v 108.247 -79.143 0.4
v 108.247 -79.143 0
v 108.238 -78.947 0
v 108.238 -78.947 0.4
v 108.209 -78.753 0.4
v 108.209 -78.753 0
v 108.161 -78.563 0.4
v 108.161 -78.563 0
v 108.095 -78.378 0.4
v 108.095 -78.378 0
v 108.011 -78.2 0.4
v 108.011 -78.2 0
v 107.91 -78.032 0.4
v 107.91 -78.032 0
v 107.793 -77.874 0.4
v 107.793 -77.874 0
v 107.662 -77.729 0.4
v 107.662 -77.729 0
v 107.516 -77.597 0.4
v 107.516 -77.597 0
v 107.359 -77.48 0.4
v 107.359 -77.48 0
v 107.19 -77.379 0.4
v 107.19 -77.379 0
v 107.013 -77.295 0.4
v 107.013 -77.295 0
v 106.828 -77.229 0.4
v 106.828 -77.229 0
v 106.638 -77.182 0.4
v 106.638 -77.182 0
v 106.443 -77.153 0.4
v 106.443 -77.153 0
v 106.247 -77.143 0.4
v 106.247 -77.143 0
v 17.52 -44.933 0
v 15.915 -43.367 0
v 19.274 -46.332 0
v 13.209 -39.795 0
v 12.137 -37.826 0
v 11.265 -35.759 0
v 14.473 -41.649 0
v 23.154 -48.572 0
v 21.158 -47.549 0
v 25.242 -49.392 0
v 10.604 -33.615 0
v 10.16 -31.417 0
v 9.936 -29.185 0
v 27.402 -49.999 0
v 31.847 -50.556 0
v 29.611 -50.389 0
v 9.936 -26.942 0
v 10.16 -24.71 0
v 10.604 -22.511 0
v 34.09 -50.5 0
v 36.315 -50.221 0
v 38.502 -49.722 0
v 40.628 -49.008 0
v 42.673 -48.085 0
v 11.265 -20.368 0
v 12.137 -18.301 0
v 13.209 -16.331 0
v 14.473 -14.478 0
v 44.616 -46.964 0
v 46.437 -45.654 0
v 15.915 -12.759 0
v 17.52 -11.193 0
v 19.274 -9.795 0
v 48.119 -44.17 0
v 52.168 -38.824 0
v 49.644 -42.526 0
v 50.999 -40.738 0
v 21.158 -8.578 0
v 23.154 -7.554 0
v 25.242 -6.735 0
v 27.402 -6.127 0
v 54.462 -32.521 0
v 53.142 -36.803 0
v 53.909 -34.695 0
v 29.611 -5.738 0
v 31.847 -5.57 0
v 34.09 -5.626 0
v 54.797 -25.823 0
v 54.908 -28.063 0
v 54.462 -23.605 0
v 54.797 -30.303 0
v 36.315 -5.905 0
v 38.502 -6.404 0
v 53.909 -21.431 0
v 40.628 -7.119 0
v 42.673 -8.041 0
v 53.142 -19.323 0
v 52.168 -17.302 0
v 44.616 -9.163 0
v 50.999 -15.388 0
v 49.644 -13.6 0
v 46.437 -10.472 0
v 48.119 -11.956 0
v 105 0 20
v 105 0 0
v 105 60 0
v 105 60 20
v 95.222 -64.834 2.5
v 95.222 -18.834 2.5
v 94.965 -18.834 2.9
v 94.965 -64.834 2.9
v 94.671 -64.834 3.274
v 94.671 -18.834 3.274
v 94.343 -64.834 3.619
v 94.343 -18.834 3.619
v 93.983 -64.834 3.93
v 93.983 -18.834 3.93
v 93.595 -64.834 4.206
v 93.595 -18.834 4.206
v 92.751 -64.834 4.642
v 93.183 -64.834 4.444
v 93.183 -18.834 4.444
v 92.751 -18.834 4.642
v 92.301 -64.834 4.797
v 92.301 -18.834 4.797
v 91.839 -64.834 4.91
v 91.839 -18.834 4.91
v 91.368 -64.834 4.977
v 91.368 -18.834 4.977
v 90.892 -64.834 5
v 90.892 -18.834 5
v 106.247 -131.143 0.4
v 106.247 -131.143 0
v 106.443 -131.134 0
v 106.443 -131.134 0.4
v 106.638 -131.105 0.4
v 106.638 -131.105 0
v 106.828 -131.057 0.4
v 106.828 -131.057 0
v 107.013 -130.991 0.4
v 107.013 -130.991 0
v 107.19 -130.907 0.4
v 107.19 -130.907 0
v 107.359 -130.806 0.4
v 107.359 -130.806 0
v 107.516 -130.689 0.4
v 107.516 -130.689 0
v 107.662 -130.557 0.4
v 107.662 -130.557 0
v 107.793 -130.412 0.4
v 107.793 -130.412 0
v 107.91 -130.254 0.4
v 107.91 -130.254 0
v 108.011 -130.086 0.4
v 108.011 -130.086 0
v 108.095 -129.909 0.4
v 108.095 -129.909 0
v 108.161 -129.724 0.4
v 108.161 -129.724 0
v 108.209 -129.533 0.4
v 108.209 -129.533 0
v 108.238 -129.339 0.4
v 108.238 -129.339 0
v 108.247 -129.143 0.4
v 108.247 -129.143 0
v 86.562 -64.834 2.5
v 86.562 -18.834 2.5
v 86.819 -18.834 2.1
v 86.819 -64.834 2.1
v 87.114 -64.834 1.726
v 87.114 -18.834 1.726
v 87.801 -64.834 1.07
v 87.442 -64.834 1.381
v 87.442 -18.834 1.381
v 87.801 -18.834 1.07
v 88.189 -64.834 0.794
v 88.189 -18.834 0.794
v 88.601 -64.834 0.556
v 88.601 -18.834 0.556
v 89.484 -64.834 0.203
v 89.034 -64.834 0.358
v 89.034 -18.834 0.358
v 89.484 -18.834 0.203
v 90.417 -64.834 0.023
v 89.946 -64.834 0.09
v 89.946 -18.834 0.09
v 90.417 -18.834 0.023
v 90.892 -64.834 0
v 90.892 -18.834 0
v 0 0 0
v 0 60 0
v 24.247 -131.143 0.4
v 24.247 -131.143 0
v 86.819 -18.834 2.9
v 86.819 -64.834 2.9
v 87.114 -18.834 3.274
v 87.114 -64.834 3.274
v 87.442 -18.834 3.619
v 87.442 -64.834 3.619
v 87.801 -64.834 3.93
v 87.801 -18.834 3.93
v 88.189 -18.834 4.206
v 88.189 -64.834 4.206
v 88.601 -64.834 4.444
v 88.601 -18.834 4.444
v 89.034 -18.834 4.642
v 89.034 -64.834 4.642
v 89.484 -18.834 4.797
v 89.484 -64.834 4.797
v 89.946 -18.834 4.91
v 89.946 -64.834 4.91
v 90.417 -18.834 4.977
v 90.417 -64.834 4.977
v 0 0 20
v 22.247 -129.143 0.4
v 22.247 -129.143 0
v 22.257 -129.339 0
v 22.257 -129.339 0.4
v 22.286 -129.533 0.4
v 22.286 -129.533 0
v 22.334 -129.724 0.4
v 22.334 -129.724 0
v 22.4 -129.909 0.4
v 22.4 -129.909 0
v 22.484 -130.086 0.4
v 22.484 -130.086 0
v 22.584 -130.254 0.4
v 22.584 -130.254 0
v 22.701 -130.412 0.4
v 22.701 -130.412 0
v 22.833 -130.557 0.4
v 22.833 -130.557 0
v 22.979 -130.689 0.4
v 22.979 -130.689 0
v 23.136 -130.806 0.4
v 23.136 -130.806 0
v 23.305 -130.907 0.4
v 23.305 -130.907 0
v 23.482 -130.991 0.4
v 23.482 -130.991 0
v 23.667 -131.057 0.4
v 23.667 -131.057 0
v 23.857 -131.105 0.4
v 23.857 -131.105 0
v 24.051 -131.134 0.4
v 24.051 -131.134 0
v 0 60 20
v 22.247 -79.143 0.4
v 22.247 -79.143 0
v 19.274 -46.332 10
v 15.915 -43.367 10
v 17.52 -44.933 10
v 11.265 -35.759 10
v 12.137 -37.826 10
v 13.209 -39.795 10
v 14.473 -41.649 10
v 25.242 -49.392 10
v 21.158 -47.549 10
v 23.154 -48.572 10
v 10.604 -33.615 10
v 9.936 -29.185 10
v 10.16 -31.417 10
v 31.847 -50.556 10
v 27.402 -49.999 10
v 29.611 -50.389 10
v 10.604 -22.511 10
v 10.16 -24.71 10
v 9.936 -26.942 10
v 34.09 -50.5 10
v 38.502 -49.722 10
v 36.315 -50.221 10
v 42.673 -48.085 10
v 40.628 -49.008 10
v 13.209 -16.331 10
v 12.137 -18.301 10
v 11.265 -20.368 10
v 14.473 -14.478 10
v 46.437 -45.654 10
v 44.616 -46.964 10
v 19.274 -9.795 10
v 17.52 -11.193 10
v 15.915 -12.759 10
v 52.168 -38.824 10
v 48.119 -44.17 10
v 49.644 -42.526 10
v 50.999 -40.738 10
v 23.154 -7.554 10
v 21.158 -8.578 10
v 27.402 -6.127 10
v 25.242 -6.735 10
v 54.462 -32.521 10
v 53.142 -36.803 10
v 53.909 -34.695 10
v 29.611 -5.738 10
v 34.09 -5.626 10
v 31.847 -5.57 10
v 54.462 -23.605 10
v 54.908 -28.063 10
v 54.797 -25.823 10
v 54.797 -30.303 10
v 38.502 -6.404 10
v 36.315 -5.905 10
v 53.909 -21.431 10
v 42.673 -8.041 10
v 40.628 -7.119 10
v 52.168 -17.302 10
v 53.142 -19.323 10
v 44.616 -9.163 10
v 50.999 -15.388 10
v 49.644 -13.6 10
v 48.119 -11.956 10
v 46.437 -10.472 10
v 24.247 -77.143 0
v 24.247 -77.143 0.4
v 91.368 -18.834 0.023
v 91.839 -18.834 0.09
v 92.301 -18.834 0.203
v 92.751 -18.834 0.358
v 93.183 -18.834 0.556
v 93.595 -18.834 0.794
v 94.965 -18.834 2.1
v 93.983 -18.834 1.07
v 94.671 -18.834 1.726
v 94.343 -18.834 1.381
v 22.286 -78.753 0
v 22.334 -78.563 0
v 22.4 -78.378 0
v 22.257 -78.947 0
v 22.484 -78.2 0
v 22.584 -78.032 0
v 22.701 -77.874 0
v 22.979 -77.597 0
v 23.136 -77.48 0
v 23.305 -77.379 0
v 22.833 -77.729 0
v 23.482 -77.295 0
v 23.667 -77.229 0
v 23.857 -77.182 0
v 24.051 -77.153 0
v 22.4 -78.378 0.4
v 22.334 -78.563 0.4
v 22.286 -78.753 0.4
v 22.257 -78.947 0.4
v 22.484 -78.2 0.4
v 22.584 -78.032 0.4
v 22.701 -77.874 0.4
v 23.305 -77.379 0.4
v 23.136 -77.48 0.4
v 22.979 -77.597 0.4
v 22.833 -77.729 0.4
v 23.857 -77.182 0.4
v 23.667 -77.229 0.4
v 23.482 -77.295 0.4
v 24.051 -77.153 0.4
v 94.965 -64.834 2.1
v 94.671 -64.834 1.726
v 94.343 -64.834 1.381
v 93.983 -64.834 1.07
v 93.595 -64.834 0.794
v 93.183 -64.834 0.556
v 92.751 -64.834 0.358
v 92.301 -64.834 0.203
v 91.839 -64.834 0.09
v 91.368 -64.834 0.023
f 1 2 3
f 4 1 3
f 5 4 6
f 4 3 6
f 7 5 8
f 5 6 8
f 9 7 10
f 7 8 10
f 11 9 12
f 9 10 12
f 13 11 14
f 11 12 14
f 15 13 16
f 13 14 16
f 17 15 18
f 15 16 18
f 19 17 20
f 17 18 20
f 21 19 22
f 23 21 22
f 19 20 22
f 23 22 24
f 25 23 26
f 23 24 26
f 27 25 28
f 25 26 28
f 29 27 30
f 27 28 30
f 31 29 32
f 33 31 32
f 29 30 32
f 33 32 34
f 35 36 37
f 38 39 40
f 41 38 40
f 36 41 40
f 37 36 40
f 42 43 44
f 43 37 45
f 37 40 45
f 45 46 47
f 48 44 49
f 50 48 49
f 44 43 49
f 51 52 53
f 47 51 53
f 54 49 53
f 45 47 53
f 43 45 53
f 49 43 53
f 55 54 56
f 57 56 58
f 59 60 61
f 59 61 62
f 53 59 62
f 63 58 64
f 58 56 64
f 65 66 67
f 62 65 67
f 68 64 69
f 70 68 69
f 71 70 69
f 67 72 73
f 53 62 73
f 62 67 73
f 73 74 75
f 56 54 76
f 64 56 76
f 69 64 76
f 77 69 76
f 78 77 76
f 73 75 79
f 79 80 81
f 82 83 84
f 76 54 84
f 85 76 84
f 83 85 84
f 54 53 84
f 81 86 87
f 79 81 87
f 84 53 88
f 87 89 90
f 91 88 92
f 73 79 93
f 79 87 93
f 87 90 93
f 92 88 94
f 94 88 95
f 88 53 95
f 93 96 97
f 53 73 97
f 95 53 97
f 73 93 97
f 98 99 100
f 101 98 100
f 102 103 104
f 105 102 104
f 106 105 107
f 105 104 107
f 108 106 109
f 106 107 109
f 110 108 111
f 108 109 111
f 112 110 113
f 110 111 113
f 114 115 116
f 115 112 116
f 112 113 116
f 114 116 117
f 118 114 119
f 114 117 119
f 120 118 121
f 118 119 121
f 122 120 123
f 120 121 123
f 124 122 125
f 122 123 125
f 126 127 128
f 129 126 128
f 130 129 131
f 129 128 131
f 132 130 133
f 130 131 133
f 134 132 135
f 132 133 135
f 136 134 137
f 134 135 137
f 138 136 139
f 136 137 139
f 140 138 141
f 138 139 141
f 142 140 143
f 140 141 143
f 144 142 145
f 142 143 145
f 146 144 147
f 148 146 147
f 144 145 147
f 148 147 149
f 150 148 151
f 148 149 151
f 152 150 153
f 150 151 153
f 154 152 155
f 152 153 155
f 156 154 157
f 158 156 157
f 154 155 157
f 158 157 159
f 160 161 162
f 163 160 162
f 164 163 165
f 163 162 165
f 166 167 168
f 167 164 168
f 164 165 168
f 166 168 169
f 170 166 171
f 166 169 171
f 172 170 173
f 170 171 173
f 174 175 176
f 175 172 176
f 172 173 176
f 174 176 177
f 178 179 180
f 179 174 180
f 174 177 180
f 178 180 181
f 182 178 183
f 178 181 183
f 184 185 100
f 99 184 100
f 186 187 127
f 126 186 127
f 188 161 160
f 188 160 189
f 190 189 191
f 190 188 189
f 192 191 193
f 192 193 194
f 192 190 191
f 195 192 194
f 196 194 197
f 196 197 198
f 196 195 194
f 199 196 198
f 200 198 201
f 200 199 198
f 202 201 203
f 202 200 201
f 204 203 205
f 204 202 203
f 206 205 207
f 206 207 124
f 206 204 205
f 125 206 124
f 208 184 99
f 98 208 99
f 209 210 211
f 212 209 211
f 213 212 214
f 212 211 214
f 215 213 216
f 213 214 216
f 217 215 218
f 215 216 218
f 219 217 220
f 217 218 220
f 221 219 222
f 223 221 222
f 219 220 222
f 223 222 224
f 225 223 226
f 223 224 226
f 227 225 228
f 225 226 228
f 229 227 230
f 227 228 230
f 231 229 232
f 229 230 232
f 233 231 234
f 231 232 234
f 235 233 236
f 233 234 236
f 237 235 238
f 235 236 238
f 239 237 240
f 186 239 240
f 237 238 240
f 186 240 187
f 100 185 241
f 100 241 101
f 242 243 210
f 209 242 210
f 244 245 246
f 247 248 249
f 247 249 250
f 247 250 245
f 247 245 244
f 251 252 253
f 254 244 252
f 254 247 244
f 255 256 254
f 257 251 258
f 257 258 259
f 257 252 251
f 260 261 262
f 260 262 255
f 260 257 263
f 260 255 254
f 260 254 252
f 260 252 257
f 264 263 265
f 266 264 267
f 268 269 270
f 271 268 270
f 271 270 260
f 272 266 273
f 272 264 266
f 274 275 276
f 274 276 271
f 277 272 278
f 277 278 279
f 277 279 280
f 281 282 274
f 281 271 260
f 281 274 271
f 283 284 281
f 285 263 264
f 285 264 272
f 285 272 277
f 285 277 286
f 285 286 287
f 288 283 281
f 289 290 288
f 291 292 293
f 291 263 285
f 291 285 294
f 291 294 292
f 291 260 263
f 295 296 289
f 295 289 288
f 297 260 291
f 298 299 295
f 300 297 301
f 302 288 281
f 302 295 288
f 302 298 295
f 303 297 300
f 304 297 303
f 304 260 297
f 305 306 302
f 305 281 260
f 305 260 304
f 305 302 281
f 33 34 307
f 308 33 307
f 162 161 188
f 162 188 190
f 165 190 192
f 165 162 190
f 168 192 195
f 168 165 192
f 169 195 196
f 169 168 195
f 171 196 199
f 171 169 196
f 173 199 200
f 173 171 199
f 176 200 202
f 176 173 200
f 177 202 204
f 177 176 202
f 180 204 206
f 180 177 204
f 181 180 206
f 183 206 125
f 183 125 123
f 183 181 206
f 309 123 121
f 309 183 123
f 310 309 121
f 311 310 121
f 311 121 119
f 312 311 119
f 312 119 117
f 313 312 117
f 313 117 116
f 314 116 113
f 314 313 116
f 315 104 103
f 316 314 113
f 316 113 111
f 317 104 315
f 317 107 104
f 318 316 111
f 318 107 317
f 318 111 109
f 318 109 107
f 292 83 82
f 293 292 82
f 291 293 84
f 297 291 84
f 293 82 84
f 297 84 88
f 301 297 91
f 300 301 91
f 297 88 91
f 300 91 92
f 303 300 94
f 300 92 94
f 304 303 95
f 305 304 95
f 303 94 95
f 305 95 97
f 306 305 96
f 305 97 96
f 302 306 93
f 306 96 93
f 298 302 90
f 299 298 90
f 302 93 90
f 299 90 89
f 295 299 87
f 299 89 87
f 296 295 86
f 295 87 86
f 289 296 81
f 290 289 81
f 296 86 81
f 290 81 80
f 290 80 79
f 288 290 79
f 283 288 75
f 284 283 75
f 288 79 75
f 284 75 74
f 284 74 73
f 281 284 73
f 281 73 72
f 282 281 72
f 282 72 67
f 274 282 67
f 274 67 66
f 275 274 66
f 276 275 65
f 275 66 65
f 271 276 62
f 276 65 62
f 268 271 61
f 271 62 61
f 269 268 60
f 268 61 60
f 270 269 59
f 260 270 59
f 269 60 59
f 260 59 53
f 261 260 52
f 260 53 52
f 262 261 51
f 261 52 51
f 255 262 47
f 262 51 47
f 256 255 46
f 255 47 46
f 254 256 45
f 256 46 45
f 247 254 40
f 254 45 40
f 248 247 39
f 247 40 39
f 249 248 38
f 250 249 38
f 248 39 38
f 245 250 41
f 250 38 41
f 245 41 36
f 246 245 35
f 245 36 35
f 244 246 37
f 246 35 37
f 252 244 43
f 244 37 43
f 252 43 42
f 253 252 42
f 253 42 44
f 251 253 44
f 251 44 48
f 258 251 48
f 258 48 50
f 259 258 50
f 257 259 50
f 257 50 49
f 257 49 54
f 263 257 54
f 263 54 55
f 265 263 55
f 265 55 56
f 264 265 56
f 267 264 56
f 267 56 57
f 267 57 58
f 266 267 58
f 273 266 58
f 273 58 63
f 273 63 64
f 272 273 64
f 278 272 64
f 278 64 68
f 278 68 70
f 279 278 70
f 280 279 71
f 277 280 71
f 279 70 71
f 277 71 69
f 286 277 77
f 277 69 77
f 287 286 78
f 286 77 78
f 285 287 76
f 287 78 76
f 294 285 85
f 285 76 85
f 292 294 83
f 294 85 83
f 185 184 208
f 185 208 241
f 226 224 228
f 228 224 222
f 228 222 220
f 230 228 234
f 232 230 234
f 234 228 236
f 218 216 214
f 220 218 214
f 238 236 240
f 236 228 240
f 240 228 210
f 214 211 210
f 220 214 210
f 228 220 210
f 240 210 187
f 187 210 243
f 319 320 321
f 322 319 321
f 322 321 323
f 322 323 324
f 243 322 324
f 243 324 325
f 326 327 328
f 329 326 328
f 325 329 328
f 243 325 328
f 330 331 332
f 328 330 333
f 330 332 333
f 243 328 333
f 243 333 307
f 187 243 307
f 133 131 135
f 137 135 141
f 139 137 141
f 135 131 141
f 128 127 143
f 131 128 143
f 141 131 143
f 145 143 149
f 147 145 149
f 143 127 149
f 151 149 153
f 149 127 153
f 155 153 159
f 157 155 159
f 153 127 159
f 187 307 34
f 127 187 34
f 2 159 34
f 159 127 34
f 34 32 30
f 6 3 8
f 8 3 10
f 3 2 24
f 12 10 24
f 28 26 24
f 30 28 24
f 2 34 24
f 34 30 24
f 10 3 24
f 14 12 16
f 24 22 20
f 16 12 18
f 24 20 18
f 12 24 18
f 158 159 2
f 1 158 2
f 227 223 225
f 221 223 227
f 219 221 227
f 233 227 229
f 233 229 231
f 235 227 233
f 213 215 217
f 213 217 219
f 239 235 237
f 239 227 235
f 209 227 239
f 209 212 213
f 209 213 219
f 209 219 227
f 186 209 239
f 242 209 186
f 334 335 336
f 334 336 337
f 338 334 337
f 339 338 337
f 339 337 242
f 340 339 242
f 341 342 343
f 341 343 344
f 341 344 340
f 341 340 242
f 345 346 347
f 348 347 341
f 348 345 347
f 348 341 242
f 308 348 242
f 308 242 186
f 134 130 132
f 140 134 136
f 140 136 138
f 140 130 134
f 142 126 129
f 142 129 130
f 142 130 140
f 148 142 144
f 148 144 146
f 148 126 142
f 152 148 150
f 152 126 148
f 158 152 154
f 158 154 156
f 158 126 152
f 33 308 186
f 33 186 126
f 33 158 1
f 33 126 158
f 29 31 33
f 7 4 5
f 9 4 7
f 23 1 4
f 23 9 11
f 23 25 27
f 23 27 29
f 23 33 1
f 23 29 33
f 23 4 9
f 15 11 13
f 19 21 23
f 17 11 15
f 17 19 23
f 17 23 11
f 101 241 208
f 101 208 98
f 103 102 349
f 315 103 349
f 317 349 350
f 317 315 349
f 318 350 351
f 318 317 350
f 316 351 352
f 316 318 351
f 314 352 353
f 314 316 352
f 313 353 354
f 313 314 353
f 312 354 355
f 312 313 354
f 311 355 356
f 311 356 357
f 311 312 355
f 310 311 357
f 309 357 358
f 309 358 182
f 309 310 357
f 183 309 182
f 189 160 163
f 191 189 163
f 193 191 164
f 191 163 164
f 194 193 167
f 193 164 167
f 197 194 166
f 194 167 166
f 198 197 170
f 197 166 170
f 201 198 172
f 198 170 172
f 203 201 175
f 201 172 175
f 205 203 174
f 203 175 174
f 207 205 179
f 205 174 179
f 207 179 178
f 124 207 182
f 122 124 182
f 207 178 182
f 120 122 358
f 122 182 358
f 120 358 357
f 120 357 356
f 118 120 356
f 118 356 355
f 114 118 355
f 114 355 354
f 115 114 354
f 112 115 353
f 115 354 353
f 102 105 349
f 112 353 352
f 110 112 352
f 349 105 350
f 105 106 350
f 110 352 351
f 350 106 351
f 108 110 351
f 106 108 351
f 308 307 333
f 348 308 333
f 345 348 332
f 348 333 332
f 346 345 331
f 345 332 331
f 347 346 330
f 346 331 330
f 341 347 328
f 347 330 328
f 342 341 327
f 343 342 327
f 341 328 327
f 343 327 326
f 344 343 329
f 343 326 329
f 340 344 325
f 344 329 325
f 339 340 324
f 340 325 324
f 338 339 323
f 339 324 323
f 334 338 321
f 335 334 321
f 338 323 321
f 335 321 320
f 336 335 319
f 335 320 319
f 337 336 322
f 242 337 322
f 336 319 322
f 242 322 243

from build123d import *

# Parameters (mm, degrees)
F0_W        = 105
F0_H        = 60
F1_DEPTH    = 20
F2_R        = 22.5
F3_DEPTH    = 10
F5_DEPTH    = 0.4
F6_W        = 10
F6_H        = 46
F7_DEPTH    = 5
F8_T1_DEPTH = 71


# Not quite as in the source:
# - a fillet or chamfer that OpenCascade refuses, or shapes differently, is made with other operations: its cross-section is extruded or revolved along the edge and cut away or added


with BuildPart() as f1:
    # F0 (on Top) → F1 (new body)
    with BuildSketch(Plane.XY):
        with Locations((52.5, 30)):
            Rectangle(F0_W, F0_H)
    extrude(amount=F1_DEPTH)


with BuildPart() as f3:
    # F2 (on Top) → F3 (new body)
    with BuildSketch(Plane.XY):
        with Locations((32.4083268642, -28.0632004142)):
            Circle(F2_R)
    extrude(amount=F3_DEPTH)


with BuildPart() as f5:
    # F4 (on Top) → F5 (new body)
    with BuildSketch(Plane.XY):
        with BuildLine():
            Line((106.2473894497, -77.1431613266), (24.2473894497, -77.1431613266))
            ThreePointArc((24.2473894497, -77.1431613266), (22.8331758874, -77.7289477643), (22.2473894497, -79.1431613266))
            Line((22.2473894497, -79.1431613266), (22.2473894497, -129.1431613266))
            ThreePointArc((22.2473894497, -129.1431613266), (22.8331758874, -130.557374889), (24.2473894497, -131.1431613266))
            Line((24.2473894497, -131.1431613266), (106.2473894497, -131.1431613266))
            ThreePointArc((106.2473894497, -131.1431613266), (107.6616030121, -130.557374889), (108.2473894497, -129.1431613266))
            Line((108.2473894497, -129.1431613266), (108.2473894497, -79.1431613266))
            ThreePointArc((108.2473894497, -79.1431613266), (107.6616030121, -77.7289477643), (106.2473894497, -77.1431613266))
        make_face()
    extrude(amount=F5_DEPTH)


with BuildPart() as f7:
    # F6 (on Top) → F7 (new body)
    with BuildSketch(Plane.XY):
        with Locations((90.8922507425, -41.8344140053)):
            Rectangle(F6_W, F6_H)
    extrude(amount=F7_DEPTH)

    # F8: fillet of radius 5 on 4 edges, made by hand

    # F8_s2 → F8_t1 (cut)
    with BuildSketch(Plane.XZ.offset(6.3344140053)):
        with BuildLine():
            ThreePointArc((95.8922507425, 5), (94.4277846484, 1.4644660941), (90.8922507425, 0))
            Line((90.8922507425, 0), (95.8922507425, 0))
            Line((95.8922507425, 0), (95.8922507425, 5))
        make_face()
        with BuildLine():
            ThreePointArc((85.8922507425, 5), (87.3567168366, 1.4644660941), (90.8922507425, 0))
            Line((90.8922507425, 0), (85.8922507425, 0))
            Line((85.8922507425, 0), (85.8922507425, 5))
        make_face()
        with BuildLine():
            ThreePointArc((85.8922507425, 0), (87.3567168366, 3.5355339059), (90.8922507425, 5))
            Line((90.8922507425, 5), (85.8922507425, 5))
            Line((85.8922507425, 5), (85.8922507425, 0))
        make_face()
        with BuildLine():
            ThreePointArc((95.8922507425, 0), (94.4277846484, 3.5355339059), (90.8922507425, 5))
            Line((90.8922507425, 5), (95.8922507425, 5))
            Line((95.8922507425, 5), (95.8922507425, 0))
        make_face()
    extrude(amount=F8_T1_DEPTH, mode=Mode.SUBTRACT)


solid = Compound([f1.part, f3.part, f5.part, f7.part])
